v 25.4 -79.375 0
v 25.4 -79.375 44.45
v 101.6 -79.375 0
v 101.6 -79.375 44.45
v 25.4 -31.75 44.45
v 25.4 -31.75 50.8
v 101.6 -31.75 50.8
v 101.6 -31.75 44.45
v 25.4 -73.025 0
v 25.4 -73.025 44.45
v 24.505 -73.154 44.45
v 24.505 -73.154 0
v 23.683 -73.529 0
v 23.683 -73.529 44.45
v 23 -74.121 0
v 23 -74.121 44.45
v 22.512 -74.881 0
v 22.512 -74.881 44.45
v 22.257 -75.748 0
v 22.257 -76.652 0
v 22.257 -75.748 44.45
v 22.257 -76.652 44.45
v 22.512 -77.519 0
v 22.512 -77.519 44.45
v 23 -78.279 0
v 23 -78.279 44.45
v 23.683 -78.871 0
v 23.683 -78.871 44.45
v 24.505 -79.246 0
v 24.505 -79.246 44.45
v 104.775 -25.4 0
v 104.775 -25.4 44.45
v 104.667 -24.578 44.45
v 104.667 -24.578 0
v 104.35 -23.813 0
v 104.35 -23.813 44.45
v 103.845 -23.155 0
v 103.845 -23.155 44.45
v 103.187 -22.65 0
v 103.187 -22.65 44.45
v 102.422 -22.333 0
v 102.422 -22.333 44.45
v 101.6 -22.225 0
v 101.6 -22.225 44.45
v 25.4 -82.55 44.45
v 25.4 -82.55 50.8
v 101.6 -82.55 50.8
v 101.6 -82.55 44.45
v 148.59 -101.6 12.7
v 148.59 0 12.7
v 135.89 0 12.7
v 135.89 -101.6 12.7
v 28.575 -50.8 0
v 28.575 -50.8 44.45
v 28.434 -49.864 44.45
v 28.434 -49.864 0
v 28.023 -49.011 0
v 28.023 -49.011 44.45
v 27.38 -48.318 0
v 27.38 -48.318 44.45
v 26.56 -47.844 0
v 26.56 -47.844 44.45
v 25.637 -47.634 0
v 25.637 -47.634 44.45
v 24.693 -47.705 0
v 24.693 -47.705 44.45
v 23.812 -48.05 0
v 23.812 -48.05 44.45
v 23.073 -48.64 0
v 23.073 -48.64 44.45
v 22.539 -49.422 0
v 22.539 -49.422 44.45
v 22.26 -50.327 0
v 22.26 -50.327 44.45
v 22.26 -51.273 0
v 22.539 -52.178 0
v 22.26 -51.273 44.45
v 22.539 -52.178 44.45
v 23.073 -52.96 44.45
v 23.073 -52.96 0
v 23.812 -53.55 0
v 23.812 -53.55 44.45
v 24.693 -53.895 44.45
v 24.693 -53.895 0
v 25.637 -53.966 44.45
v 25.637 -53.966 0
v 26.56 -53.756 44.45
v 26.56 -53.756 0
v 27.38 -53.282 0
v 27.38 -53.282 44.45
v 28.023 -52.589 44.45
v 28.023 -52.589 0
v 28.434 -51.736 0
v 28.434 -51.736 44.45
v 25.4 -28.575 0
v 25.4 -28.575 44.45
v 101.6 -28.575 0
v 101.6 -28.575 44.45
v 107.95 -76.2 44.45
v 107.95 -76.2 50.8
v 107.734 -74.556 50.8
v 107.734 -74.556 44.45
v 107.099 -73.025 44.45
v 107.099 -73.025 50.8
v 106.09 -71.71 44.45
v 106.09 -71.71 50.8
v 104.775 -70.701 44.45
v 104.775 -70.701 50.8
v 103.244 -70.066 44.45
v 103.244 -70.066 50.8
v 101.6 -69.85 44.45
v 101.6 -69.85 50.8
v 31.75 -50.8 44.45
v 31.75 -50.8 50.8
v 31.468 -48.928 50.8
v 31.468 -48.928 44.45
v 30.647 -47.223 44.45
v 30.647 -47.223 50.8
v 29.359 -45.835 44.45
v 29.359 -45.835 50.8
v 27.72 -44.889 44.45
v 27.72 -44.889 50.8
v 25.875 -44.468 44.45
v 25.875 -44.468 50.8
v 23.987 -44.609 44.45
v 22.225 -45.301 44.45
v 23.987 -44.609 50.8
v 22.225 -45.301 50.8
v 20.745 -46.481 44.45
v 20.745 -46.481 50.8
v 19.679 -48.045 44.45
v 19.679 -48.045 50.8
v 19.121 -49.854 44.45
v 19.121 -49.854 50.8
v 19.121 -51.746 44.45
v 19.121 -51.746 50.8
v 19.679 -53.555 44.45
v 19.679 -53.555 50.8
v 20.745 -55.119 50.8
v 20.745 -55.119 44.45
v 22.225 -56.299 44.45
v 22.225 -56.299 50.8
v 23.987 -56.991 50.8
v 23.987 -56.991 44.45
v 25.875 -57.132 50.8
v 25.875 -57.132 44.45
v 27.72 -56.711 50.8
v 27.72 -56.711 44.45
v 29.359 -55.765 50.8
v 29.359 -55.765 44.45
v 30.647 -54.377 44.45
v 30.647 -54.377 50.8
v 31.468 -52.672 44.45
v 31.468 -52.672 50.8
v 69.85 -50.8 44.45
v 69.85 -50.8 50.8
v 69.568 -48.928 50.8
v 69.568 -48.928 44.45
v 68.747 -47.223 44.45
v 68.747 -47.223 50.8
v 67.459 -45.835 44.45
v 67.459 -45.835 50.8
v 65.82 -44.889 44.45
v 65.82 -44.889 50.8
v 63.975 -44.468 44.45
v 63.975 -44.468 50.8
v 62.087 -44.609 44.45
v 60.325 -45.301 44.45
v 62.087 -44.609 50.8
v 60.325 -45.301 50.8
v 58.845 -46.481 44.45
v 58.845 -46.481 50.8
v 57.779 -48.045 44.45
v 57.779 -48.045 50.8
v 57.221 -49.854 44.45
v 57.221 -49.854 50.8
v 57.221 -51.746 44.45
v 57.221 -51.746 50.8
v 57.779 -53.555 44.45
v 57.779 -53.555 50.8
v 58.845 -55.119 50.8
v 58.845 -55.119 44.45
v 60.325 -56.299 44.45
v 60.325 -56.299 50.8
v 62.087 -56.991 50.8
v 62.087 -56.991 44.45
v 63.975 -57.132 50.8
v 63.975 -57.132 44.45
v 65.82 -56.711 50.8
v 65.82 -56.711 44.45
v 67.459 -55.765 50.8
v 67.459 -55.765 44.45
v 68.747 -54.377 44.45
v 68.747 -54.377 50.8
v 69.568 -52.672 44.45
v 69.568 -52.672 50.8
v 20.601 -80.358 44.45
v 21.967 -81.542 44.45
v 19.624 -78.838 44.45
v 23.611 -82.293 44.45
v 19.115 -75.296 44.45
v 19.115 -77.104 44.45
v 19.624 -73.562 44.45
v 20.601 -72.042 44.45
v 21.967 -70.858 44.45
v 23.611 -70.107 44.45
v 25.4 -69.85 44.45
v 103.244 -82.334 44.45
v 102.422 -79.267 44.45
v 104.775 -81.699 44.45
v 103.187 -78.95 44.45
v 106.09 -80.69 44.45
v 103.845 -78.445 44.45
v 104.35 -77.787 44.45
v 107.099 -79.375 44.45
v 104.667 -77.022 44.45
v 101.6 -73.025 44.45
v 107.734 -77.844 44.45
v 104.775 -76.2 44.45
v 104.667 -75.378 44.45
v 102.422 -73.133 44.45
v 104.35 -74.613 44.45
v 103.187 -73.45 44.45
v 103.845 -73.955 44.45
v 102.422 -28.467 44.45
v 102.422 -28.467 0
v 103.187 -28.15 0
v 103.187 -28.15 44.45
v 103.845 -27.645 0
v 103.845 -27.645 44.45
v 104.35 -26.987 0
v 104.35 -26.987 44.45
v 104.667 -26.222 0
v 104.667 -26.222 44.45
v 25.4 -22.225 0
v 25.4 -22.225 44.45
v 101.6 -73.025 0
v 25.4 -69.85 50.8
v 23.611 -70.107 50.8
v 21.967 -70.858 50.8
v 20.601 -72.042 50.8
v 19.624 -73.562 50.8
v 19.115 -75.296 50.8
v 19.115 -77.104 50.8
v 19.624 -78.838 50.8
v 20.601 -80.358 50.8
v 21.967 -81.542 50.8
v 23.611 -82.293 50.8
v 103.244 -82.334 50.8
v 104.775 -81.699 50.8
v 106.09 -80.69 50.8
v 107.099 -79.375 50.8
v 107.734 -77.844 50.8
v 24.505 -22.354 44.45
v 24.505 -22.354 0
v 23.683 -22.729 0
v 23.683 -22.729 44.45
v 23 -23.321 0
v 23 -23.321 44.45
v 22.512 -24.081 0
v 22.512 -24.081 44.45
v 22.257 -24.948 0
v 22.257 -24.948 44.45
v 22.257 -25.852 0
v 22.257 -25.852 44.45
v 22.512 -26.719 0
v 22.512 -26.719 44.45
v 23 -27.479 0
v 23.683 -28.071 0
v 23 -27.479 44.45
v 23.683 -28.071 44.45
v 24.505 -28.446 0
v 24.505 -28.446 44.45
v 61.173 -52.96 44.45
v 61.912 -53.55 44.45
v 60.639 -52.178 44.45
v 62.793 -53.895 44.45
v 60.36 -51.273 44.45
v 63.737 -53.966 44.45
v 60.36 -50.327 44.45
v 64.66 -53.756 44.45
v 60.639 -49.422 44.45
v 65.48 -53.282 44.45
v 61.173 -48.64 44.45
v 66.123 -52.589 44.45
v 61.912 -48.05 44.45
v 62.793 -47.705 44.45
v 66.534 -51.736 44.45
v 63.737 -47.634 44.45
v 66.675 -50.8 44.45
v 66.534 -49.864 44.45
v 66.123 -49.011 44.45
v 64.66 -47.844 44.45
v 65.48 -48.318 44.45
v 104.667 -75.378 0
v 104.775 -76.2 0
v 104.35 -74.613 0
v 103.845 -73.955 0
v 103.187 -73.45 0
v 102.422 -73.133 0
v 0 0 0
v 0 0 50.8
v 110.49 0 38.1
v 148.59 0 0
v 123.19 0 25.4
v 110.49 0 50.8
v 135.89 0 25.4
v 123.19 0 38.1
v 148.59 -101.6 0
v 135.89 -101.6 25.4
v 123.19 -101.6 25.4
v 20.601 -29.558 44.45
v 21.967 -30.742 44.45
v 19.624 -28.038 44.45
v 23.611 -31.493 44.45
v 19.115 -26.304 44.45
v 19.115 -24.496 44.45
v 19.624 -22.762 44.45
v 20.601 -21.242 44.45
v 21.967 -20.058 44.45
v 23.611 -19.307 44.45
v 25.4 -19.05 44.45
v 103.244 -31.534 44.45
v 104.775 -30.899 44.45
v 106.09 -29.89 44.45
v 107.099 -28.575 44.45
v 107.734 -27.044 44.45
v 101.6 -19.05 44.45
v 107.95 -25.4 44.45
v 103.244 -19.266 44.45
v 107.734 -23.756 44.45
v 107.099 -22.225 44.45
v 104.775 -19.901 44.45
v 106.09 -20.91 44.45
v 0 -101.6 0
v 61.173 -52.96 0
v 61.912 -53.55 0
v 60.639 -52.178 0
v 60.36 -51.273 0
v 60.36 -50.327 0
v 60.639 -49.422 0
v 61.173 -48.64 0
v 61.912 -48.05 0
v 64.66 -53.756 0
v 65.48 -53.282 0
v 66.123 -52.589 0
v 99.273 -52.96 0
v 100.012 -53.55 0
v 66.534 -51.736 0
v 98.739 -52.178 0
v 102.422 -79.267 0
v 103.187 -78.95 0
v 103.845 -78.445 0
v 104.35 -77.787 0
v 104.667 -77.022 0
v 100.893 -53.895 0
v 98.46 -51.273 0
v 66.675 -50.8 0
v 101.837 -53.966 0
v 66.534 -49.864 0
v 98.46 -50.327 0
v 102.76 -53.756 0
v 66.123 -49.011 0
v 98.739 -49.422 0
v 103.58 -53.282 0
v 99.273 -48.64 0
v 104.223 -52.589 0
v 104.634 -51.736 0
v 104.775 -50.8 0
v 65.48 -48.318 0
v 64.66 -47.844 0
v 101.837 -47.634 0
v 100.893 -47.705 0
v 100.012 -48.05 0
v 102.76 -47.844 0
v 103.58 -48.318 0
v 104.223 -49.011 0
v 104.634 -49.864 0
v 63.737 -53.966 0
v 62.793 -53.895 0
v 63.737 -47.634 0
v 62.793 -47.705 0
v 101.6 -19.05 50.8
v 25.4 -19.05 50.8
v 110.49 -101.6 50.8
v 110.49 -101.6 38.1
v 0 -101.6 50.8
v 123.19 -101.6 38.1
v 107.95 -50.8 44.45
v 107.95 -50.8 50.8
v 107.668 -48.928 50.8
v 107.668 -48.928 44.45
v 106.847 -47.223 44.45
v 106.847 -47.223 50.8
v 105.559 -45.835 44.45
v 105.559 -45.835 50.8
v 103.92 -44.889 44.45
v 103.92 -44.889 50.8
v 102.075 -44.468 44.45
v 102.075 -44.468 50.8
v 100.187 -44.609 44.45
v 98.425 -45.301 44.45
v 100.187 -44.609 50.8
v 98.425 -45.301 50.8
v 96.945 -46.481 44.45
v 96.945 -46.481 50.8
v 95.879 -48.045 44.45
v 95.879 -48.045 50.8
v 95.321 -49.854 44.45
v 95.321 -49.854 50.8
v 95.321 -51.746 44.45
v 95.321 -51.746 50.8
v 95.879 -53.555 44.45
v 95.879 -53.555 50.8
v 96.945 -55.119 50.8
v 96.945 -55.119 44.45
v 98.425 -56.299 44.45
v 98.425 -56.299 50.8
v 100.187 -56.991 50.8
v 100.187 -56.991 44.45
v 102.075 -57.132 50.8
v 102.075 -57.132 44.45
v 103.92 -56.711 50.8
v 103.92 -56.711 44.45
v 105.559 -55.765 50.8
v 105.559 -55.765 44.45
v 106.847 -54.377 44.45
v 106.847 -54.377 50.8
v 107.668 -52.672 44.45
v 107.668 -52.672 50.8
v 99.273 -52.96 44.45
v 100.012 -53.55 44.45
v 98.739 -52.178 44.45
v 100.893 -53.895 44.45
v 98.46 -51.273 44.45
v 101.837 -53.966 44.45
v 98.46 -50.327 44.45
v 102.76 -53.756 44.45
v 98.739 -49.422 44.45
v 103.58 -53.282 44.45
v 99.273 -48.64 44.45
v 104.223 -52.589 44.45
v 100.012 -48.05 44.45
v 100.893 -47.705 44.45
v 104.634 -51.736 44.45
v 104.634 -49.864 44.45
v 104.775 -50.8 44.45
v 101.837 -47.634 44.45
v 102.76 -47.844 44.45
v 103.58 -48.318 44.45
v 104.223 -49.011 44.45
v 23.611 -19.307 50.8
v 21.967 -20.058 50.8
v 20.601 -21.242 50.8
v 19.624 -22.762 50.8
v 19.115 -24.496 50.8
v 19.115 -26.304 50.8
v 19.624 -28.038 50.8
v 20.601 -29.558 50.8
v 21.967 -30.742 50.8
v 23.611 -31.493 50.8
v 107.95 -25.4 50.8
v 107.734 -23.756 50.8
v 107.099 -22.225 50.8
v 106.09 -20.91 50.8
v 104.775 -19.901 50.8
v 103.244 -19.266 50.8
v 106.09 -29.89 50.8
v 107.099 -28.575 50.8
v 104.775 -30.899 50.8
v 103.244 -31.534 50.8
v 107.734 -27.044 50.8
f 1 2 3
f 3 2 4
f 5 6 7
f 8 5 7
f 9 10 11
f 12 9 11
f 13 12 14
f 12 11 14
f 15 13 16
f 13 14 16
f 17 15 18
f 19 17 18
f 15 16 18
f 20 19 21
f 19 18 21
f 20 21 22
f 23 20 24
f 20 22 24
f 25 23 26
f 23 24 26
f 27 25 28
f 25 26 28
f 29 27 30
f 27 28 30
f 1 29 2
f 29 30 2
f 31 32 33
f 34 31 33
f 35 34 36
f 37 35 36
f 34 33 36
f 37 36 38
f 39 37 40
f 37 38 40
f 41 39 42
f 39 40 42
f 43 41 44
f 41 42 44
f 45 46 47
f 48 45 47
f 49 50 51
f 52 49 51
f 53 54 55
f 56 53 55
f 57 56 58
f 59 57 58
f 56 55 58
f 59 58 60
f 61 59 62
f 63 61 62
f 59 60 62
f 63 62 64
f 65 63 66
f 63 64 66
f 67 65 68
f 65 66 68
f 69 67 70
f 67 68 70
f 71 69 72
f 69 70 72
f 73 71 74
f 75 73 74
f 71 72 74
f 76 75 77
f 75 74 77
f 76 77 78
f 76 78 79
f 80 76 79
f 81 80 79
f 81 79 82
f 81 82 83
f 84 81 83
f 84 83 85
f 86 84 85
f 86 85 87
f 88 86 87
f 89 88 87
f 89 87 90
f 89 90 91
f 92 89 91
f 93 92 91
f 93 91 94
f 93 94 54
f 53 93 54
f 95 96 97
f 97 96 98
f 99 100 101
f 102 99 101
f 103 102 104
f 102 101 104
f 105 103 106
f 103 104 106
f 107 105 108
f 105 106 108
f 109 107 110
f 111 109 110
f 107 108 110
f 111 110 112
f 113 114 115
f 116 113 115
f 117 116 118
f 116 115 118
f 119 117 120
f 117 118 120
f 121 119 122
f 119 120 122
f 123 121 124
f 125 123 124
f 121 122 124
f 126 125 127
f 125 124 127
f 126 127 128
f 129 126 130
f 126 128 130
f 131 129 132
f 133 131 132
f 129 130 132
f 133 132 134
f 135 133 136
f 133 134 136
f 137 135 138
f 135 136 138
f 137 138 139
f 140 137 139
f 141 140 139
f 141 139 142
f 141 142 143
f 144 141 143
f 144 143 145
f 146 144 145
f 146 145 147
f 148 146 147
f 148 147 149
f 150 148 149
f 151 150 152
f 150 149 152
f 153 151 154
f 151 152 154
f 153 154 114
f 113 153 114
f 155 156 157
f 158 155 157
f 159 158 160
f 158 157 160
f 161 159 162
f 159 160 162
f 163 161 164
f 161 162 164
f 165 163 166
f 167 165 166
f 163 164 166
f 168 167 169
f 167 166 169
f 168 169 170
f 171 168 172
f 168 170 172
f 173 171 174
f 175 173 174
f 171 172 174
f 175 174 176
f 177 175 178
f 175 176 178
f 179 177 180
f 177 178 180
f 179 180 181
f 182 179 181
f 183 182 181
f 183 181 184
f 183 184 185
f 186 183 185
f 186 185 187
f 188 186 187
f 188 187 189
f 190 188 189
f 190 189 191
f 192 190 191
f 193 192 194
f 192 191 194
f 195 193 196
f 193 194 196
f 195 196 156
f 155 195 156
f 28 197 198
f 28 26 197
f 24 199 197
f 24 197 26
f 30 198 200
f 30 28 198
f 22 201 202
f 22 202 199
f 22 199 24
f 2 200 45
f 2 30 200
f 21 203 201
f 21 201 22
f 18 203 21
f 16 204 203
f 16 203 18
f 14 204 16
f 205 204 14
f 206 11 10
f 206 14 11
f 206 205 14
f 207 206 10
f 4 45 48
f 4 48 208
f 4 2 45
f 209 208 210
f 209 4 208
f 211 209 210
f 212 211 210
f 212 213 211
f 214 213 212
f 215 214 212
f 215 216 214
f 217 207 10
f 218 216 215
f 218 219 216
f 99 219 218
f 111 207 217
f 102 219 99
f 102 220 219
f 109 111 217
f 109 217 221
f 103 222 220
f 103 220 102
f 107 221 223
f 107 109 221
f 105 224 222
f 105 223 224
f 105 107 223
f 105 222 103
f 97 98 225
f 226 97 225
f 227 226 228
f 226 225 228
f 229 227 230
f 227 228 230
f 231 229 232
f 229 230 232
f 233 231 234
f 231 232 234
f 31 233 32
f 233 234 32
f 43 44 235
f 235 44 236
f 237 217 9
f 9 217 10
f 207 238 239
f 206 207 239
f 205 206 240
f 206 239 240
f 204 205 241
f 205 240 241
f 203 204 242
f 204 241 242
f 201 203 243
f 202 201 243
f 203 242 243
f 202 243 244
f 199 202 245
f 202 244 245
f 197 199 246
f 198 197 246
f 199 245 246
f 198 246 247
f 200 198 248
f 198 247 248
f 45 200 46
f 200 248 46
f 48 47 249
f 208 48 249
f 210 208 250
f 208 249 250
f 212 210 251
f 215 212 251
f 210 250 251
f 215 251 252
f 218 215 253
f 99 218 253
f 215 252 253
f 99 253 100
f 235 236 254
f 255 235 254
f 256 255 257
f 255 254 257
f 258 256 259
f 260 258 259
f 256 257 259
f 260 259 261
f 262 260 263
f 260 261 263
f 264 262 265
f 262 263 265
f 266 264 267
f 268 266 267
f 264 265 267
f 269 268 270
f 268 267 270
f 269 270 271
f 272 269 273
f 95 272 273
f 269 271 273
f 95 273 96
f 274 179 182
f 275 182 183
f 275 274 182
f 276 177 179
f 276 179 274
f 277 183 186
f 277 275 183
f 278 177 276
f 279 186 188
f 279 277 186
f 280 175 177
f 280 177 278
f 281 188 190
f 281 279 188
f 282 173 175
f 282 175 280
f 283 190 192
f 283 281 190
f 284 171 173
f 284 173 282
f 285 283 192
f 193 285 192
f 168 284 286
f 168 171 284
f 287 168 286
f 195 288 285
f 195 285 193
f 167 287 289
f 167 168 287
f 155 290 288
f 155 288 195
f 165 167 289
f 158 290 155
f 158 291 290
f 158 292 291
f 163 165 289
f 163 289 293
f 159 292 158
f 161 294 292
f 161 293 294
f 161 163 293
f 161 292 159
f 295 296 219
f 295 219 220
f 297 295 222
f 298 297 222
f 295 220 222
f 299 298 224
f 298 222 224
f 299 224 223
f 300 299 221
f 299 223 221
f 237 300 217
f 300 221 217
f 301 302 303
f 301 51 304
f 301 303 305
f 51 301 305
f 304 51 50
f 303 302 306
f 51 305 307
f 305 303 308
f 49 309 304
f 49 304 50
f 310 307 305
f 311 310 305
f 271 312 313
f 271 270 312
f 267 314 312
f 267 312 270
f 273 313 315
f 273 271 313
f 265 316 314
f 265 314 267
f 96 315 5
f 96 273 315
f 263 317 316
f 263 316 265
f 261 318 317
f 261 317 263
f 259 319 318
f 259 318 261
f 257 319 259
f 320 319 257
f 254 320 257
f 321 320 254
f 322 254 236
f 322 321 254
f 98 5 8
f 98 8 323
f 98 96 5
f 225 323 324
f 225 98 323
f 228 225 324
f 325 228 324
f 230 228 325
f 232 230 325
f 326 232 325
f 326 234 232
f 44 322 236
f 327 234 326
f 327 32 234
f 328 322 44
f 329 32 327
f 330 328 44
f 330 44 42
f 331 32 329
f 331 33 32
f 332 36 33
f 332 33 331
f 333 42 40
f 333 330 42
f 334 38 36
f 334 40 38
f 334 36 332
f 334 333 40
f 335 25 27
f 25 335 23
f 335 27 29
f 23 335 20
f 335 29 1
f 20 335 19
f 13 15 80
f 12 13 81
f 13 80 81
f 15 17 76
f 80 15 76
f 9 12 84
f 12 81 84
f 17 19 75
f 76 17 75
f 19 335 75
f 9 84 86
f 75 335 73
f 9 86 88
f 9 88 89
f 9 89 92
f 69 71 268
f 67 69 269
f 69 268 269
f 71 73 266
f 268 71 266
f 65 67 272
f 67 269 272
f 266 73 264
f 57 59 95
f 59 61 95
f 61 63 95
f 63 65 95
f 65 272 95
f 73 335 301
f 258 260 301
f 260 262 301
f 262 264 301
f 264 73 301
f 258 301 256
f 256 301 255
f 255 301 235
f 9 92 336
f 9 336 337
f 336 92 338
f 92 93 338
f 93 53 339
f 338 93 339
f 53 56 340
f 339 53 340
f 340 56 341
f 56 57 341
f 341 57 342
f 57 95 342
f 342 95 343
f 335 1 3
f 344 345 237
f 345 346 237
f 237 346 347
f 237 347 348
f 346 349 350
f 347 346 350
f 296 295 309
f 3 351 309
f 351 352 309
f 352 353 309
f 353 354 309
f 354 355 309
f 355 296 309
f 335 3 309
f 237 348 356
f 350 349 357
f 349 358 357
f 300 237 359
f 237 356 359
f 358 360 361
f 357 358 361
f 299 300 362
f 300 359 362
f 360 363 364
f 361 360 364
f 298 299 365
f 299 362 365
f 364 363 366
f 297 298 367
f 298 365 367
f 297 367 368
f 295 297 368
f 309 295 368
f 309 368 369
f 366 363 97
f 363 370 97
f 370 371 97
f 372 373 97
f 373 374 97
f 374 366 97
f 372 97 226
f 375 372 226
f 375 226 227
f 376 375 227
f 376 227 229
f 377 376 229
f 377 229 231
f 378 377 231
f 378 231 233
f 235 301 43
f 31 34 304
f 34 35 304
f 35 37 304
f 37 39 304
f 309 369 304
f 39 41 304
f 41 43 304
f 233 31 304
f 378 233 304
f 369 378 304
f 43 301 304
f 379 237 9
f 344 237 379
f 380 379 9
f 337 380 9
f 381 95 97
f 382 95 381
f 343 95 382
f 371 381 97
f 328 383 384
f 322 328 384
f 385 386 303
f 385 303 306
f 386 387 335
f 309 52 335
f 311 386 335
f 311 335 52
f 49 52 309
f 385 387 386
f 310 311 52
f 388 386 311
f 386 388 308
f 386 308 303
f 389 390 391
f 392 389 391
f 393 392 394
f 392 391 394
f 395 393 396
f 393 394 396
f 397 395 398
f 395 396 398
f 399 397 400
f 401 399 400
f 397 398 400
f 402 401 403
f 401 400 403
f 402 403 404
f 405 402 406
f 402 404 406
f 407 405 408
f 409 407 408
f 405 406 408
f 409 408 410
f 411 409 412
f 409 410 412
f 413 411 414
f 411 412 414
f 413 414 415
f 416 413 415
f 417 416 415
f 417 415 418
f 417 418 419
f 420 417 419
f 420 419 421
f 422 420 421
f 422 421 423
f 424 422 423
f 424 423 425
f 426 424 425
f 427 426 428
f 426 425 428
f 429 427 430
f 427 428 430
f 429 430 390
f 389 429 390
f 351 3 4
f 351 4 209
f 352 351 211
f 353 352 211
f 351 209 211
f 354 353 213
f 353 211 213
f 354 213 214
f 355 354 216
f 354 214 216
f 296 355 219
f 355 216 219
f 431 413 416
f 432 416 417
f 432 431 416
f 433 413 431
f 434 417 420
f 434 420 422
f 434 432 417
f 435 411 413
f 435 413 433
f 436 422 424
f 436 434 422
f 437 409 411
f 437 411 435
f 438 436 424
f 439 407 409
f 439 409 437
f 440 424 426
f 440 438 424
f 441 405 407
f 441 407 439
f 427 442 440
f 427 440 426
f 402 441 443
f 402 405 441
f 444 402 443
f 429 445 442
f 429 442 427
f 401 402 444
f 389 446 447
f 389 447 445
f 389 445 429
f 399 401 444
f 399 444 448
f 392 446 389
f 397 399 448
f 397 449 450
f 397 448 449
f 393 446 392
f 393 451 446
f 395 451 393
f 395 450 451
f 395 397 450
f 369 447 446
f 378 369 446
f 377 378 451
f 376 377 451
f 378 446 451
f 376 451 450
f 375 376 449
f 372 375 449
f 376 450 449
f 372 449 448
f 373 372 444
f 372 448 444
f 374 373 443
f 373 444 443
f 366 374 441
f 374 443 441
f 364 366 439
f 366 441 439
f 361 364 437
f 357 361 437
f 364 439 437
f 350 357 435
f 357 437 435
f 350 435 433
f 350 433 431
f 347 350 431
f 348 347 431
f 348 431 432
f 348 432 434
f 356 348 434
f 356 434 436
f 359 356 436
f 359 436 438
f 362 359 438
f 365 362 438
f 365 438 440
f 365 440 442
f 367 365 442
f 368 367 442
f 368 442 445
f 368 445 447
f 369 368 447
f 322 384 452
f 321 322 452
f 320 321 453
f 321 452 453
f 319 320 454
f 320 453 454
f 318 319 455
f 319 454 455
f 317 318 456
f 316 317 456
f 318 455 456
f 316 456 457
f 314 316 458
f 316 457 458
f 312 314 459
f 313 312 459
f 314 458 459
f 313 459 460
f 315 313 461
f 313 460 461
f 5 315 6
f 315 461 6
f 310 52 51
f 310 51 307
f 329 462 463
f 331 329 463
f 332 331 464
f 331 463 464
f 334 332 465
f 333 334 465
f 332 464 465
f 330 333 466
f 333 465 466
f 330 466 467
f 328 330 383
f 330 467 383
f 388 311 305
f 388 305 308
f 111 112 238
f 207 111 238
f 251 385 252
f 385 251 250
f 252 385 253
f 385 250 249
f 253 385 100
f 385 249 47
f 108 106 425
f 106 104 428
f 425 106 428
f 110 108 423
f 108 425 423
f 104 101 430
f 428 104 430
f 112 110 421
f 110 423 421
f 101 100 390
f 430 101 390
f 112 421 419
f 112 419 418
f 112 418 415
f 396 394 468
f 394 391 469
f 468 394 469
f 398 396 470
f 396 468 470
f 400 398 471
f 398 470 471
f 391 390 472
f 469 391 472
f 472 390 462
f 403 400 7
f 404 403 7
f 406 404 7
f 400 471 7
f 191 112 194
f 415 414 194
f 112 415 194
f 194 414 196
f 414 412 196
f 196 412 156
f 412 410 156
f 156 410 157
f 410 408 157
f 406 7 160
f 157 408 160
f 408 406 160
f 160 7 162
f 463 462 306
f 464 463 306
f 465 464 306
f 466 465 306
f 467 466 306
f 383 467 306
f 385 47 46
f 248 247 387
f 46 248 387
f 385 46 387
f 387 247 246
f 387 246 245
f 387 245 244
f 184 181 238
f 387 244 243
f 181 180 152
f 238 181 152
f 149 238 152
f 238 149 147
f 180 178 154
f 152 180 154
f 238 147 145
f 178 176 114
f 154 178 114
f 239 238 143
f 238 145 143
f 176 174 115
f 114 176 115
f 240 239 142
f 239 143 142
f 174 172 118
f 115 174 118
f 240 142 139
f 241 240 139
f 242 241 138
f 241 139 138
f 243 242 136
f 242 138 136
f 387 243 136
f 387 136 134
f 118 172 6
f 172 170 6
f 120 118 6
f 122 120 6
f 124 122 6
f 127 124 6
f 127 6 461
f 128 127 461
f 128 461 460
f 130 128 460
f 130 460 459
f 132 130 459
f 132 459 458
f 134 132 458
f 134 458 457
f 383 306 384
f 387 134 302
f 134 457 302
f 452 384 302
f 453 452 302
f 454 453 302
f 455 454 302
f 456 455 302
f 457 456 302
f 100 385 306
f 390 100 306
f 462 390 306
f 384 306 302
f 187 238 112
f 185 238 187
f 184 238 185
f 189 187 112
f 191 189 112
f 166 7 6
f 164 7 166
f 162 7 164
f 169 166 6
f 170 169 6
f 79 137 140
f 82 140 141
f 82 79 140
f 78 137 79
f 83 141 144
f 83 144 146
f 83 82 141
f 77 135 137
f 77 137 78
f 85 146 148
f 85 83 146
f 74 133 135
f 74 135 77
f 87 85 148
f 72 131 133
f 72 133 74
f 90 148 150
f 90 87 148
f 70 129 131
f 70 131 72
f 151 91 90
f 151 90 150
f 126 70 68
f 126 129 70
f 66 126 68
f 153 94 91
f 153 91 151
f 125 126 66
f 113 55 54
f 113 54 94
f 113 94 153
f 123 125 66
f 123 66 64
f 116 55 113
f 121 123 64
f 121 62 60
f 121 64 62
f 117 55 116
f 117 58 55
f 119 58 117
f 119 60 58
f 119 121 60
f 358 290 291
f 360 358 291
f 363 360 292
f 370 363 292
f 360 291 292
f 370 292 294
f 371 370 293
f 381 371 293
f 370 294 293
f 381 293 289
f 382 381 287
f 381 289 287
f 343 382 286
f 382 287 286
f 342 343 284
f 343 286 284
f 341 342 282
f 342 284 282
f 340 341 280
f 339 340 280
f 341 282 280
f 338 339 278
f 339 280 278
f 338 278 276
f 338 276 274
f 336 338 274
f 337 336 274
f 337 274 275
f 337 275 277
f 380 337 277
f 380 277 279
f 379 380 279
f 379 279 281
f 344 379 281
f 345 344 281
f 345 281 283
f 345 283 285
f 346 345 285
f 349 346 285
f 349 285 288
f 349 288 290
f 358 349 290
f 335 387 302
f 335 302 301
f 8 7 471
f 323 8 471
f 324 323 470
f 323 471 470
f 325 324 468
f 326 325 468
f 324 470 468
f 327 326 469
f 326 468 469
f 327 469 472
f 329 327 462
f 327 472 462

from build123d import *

# Parameters (mm, degrees)
F1_DEPTH = 101.6
F3_DEPTH = 6.35
F4_R     = 3.175
F5_DEPTH = 50.801
F6_R     = 6.35
F7_DEPTH = 6.35


with BuildPart() as f1:
    # F0 (on Front) → F1 (new body)
    with BuildSketch(Plane.XZ):
        Polygon((0, 50.8), (0, 0), (148.59, 0), (148.59, 12.7), (135.89, 12.7), (135.89, 25.4), (123.19, 25.4), (123.19, 38.1), (110.49, 38.1), (110.49, 50.8), align=None)
    extrude(amount=F1_DEPTH)

    # F2 (on face) → F3 (cut)
    with BuildSketch(Plane.XY.offset(50.8)):
        with BuildLine():
            ThreePointArc((25.4, -31.75), (29.890128, -29.890128), (31.75, -25.4))
            ThreePointArc((31.75, -25.4), (29.890128, -20.909872), (25.4, -19.05))
            ThreePointArc((25.4, -19.05), (19.05, -25.4), (25.4, -31.75))
        make_face()
        with BuildLine():
            ThreePointArc((25.4, -19.05), (29.890128, -20.909872), (31.75, -25.4))
            ThreePointArc((31.75, -25.4), (29.890128, -29.890128), (25.4, -31.75))
            Line((25.4, -31.75), (101.6, -31.75))
            ThreePointArc((101.6, -31.75), (95.25, -25.4), (101.6, -19.05))
            Line((101.6, -19.05), (25.4, -19.05))
        make_face()
        with BuildLine():
            ThreePointArc((107.95, -25.4), (106.090128, -20.909872), (101.6, -19.05))
            ThreePointArc((101.6, -19.05), (95.25, -25.4), (101.6, -31.75))
            ThreePointArc((101.6, -31.75), (106.090128, -29.890128), (107.95, -25.4))
        make_face()
        with BuildLine():
            ThreePointArc((31.75, -76.2), (29.890128, -80.690128), (25.4, -82.55))
            Line((25.4, -82.55), (101.6, -82.55))
            ThreePointArc((101.6, -82.55), (95.25, -76.2), (101.6, -69.85))
            Line((101.6, -69.85), (25.4, -69.85))
            ThreePointArc((25.4, -69.85), (29.890128, -71.709872), (31.75, -76.2))
        make_face()
        with BuildLine():
            ThreePointArc((25.4, -69.85), (19.05, -76.2), (25.4, -82.55))
            ThreePointArc((25.4, -82.55), (29.890128, -80.690128), (31.75, -76.2))
            ThreePointArc((31.75, -76.2), (29.890128, -71.709872), (25.4, -69.85))
        make_face()
        with BuildLine():
            ThreePointArc((101.6, -69.85), (95.25, -76.2), (101.6, -82.55))
            ThreePointArc((101.6, -82.55), (106.090128, -80.690128), (107.95, -76.2))
            ThreePointArc((107.95, -76.2), (106.090128, -71.709872), (101.6, -69.85))
        make_face()
    extrude(amount=-F3_DEPTH, mode=Mode.SUBTRACT)

    # F4 (on face) → F5 (cut, through all)
    with BuildSketch(Plane.XY.offset(50.8)):
        with Locations((101.6, -50.8)):
            Circle(F4_R)
        with Locations((63.5, -50.8)):
            Circle(F4_R)
        with BuildLine():
            ThreePointArc((25.4, -28.575), (27.645064, -27.645064), (28.575, -25.4))
            ThreePointArc((28.575, -25.4), (27.645064, -23.154936), (25.4, -22.225))
            ThreePointArc((25.4, -22.225), (22.225, -25.4), (25.4, -28.575))
        make_face()
        with BuildLine():
            ThreePointArc((25.4, -22.225), (27.645064, -23.154936), (28.575, -25.4))
            ThreePointArc((28.575, -25.4), (27.645064, -27.645064), (25.4, -28.575))
            Line((25.4, -28.575), (101.6, -28.575))
            ThreePointArc((101.6, -28.575), (98.425, -25.4), (101.6, -22.225))
            Line((101.6, -22.225), (25.4, -22.225))
        make_face()
        with BuildLine():
            ThreePointArc((104.775, -25.4), (103.845064, -23.154936), (101.6, -22.225))
            ThreePointArc((101.6, -22.225), (98.425, -25.4), (101.6, -28.575))
            ThreePointArc((101.6, -28.575), (103.845064, -27.645064), (104.775, -25.4))
        make_face()
        with Locations((25.4, -50.8)):
            Circle(F4_R)
        with BuildLine():
            ThreePointArc((25.4, -79.375), (27.645064, -78.445064), (28.575, -76.2))
            ThreePointArc((28.575, -76.2), (27.645064, -73.954936), (25.4, -73.025))
            ThreePointArc((25.4, -73.025), (22.225, -76.2), (25.4, -79.375))
        make_face()
        with BuildLine():
            ThreePointArc((25.4, -73.025), (27.645064, -73.954936), (28.575, -76.2))
            ThreePointArc((28.575, -76.2), (27.645064, -78.445064), (25.4, -79.375))
            Line((25.4, -79.375), (101.6, -79.375))
            ThreePointArc((101.6, -79.375), (98.425, -76.2), (101.6, -73.025))
            Line((101.6, -73.025), (25.4, -73.025))
        make_face()
        with BuildLine():
            ThreePointArc((104.775, -76.2), (103.845064, -73.954936), (101.6, -73.025))
            ThreePointArc((101.6, -73.025), (98.425, -76.2), (101.6, -79.375))
            ThreePointArc((101.6, -79.375), (103.845064, -78.445064), (104.775, -76.2))
        make_face()
    extrude(amount=-F5_DEPTH, mode=Mode.SUBTRACT)

    # F6 (on face) → F7 (cut)
    with BuildSketch(Plane.XY.offset(50.8)):
        with Locations((101.6, -50.8)):
            Circle(F6_R)
        with Locations((63.5, -50.8)):
            Circle(F6_R)
        with Locations((25.4, -50.8)):
            Circle(F6_R)
    extrude(amount=-F7_DEPTH, mode=Mode.SUBTRACT)


solid = f1.part
